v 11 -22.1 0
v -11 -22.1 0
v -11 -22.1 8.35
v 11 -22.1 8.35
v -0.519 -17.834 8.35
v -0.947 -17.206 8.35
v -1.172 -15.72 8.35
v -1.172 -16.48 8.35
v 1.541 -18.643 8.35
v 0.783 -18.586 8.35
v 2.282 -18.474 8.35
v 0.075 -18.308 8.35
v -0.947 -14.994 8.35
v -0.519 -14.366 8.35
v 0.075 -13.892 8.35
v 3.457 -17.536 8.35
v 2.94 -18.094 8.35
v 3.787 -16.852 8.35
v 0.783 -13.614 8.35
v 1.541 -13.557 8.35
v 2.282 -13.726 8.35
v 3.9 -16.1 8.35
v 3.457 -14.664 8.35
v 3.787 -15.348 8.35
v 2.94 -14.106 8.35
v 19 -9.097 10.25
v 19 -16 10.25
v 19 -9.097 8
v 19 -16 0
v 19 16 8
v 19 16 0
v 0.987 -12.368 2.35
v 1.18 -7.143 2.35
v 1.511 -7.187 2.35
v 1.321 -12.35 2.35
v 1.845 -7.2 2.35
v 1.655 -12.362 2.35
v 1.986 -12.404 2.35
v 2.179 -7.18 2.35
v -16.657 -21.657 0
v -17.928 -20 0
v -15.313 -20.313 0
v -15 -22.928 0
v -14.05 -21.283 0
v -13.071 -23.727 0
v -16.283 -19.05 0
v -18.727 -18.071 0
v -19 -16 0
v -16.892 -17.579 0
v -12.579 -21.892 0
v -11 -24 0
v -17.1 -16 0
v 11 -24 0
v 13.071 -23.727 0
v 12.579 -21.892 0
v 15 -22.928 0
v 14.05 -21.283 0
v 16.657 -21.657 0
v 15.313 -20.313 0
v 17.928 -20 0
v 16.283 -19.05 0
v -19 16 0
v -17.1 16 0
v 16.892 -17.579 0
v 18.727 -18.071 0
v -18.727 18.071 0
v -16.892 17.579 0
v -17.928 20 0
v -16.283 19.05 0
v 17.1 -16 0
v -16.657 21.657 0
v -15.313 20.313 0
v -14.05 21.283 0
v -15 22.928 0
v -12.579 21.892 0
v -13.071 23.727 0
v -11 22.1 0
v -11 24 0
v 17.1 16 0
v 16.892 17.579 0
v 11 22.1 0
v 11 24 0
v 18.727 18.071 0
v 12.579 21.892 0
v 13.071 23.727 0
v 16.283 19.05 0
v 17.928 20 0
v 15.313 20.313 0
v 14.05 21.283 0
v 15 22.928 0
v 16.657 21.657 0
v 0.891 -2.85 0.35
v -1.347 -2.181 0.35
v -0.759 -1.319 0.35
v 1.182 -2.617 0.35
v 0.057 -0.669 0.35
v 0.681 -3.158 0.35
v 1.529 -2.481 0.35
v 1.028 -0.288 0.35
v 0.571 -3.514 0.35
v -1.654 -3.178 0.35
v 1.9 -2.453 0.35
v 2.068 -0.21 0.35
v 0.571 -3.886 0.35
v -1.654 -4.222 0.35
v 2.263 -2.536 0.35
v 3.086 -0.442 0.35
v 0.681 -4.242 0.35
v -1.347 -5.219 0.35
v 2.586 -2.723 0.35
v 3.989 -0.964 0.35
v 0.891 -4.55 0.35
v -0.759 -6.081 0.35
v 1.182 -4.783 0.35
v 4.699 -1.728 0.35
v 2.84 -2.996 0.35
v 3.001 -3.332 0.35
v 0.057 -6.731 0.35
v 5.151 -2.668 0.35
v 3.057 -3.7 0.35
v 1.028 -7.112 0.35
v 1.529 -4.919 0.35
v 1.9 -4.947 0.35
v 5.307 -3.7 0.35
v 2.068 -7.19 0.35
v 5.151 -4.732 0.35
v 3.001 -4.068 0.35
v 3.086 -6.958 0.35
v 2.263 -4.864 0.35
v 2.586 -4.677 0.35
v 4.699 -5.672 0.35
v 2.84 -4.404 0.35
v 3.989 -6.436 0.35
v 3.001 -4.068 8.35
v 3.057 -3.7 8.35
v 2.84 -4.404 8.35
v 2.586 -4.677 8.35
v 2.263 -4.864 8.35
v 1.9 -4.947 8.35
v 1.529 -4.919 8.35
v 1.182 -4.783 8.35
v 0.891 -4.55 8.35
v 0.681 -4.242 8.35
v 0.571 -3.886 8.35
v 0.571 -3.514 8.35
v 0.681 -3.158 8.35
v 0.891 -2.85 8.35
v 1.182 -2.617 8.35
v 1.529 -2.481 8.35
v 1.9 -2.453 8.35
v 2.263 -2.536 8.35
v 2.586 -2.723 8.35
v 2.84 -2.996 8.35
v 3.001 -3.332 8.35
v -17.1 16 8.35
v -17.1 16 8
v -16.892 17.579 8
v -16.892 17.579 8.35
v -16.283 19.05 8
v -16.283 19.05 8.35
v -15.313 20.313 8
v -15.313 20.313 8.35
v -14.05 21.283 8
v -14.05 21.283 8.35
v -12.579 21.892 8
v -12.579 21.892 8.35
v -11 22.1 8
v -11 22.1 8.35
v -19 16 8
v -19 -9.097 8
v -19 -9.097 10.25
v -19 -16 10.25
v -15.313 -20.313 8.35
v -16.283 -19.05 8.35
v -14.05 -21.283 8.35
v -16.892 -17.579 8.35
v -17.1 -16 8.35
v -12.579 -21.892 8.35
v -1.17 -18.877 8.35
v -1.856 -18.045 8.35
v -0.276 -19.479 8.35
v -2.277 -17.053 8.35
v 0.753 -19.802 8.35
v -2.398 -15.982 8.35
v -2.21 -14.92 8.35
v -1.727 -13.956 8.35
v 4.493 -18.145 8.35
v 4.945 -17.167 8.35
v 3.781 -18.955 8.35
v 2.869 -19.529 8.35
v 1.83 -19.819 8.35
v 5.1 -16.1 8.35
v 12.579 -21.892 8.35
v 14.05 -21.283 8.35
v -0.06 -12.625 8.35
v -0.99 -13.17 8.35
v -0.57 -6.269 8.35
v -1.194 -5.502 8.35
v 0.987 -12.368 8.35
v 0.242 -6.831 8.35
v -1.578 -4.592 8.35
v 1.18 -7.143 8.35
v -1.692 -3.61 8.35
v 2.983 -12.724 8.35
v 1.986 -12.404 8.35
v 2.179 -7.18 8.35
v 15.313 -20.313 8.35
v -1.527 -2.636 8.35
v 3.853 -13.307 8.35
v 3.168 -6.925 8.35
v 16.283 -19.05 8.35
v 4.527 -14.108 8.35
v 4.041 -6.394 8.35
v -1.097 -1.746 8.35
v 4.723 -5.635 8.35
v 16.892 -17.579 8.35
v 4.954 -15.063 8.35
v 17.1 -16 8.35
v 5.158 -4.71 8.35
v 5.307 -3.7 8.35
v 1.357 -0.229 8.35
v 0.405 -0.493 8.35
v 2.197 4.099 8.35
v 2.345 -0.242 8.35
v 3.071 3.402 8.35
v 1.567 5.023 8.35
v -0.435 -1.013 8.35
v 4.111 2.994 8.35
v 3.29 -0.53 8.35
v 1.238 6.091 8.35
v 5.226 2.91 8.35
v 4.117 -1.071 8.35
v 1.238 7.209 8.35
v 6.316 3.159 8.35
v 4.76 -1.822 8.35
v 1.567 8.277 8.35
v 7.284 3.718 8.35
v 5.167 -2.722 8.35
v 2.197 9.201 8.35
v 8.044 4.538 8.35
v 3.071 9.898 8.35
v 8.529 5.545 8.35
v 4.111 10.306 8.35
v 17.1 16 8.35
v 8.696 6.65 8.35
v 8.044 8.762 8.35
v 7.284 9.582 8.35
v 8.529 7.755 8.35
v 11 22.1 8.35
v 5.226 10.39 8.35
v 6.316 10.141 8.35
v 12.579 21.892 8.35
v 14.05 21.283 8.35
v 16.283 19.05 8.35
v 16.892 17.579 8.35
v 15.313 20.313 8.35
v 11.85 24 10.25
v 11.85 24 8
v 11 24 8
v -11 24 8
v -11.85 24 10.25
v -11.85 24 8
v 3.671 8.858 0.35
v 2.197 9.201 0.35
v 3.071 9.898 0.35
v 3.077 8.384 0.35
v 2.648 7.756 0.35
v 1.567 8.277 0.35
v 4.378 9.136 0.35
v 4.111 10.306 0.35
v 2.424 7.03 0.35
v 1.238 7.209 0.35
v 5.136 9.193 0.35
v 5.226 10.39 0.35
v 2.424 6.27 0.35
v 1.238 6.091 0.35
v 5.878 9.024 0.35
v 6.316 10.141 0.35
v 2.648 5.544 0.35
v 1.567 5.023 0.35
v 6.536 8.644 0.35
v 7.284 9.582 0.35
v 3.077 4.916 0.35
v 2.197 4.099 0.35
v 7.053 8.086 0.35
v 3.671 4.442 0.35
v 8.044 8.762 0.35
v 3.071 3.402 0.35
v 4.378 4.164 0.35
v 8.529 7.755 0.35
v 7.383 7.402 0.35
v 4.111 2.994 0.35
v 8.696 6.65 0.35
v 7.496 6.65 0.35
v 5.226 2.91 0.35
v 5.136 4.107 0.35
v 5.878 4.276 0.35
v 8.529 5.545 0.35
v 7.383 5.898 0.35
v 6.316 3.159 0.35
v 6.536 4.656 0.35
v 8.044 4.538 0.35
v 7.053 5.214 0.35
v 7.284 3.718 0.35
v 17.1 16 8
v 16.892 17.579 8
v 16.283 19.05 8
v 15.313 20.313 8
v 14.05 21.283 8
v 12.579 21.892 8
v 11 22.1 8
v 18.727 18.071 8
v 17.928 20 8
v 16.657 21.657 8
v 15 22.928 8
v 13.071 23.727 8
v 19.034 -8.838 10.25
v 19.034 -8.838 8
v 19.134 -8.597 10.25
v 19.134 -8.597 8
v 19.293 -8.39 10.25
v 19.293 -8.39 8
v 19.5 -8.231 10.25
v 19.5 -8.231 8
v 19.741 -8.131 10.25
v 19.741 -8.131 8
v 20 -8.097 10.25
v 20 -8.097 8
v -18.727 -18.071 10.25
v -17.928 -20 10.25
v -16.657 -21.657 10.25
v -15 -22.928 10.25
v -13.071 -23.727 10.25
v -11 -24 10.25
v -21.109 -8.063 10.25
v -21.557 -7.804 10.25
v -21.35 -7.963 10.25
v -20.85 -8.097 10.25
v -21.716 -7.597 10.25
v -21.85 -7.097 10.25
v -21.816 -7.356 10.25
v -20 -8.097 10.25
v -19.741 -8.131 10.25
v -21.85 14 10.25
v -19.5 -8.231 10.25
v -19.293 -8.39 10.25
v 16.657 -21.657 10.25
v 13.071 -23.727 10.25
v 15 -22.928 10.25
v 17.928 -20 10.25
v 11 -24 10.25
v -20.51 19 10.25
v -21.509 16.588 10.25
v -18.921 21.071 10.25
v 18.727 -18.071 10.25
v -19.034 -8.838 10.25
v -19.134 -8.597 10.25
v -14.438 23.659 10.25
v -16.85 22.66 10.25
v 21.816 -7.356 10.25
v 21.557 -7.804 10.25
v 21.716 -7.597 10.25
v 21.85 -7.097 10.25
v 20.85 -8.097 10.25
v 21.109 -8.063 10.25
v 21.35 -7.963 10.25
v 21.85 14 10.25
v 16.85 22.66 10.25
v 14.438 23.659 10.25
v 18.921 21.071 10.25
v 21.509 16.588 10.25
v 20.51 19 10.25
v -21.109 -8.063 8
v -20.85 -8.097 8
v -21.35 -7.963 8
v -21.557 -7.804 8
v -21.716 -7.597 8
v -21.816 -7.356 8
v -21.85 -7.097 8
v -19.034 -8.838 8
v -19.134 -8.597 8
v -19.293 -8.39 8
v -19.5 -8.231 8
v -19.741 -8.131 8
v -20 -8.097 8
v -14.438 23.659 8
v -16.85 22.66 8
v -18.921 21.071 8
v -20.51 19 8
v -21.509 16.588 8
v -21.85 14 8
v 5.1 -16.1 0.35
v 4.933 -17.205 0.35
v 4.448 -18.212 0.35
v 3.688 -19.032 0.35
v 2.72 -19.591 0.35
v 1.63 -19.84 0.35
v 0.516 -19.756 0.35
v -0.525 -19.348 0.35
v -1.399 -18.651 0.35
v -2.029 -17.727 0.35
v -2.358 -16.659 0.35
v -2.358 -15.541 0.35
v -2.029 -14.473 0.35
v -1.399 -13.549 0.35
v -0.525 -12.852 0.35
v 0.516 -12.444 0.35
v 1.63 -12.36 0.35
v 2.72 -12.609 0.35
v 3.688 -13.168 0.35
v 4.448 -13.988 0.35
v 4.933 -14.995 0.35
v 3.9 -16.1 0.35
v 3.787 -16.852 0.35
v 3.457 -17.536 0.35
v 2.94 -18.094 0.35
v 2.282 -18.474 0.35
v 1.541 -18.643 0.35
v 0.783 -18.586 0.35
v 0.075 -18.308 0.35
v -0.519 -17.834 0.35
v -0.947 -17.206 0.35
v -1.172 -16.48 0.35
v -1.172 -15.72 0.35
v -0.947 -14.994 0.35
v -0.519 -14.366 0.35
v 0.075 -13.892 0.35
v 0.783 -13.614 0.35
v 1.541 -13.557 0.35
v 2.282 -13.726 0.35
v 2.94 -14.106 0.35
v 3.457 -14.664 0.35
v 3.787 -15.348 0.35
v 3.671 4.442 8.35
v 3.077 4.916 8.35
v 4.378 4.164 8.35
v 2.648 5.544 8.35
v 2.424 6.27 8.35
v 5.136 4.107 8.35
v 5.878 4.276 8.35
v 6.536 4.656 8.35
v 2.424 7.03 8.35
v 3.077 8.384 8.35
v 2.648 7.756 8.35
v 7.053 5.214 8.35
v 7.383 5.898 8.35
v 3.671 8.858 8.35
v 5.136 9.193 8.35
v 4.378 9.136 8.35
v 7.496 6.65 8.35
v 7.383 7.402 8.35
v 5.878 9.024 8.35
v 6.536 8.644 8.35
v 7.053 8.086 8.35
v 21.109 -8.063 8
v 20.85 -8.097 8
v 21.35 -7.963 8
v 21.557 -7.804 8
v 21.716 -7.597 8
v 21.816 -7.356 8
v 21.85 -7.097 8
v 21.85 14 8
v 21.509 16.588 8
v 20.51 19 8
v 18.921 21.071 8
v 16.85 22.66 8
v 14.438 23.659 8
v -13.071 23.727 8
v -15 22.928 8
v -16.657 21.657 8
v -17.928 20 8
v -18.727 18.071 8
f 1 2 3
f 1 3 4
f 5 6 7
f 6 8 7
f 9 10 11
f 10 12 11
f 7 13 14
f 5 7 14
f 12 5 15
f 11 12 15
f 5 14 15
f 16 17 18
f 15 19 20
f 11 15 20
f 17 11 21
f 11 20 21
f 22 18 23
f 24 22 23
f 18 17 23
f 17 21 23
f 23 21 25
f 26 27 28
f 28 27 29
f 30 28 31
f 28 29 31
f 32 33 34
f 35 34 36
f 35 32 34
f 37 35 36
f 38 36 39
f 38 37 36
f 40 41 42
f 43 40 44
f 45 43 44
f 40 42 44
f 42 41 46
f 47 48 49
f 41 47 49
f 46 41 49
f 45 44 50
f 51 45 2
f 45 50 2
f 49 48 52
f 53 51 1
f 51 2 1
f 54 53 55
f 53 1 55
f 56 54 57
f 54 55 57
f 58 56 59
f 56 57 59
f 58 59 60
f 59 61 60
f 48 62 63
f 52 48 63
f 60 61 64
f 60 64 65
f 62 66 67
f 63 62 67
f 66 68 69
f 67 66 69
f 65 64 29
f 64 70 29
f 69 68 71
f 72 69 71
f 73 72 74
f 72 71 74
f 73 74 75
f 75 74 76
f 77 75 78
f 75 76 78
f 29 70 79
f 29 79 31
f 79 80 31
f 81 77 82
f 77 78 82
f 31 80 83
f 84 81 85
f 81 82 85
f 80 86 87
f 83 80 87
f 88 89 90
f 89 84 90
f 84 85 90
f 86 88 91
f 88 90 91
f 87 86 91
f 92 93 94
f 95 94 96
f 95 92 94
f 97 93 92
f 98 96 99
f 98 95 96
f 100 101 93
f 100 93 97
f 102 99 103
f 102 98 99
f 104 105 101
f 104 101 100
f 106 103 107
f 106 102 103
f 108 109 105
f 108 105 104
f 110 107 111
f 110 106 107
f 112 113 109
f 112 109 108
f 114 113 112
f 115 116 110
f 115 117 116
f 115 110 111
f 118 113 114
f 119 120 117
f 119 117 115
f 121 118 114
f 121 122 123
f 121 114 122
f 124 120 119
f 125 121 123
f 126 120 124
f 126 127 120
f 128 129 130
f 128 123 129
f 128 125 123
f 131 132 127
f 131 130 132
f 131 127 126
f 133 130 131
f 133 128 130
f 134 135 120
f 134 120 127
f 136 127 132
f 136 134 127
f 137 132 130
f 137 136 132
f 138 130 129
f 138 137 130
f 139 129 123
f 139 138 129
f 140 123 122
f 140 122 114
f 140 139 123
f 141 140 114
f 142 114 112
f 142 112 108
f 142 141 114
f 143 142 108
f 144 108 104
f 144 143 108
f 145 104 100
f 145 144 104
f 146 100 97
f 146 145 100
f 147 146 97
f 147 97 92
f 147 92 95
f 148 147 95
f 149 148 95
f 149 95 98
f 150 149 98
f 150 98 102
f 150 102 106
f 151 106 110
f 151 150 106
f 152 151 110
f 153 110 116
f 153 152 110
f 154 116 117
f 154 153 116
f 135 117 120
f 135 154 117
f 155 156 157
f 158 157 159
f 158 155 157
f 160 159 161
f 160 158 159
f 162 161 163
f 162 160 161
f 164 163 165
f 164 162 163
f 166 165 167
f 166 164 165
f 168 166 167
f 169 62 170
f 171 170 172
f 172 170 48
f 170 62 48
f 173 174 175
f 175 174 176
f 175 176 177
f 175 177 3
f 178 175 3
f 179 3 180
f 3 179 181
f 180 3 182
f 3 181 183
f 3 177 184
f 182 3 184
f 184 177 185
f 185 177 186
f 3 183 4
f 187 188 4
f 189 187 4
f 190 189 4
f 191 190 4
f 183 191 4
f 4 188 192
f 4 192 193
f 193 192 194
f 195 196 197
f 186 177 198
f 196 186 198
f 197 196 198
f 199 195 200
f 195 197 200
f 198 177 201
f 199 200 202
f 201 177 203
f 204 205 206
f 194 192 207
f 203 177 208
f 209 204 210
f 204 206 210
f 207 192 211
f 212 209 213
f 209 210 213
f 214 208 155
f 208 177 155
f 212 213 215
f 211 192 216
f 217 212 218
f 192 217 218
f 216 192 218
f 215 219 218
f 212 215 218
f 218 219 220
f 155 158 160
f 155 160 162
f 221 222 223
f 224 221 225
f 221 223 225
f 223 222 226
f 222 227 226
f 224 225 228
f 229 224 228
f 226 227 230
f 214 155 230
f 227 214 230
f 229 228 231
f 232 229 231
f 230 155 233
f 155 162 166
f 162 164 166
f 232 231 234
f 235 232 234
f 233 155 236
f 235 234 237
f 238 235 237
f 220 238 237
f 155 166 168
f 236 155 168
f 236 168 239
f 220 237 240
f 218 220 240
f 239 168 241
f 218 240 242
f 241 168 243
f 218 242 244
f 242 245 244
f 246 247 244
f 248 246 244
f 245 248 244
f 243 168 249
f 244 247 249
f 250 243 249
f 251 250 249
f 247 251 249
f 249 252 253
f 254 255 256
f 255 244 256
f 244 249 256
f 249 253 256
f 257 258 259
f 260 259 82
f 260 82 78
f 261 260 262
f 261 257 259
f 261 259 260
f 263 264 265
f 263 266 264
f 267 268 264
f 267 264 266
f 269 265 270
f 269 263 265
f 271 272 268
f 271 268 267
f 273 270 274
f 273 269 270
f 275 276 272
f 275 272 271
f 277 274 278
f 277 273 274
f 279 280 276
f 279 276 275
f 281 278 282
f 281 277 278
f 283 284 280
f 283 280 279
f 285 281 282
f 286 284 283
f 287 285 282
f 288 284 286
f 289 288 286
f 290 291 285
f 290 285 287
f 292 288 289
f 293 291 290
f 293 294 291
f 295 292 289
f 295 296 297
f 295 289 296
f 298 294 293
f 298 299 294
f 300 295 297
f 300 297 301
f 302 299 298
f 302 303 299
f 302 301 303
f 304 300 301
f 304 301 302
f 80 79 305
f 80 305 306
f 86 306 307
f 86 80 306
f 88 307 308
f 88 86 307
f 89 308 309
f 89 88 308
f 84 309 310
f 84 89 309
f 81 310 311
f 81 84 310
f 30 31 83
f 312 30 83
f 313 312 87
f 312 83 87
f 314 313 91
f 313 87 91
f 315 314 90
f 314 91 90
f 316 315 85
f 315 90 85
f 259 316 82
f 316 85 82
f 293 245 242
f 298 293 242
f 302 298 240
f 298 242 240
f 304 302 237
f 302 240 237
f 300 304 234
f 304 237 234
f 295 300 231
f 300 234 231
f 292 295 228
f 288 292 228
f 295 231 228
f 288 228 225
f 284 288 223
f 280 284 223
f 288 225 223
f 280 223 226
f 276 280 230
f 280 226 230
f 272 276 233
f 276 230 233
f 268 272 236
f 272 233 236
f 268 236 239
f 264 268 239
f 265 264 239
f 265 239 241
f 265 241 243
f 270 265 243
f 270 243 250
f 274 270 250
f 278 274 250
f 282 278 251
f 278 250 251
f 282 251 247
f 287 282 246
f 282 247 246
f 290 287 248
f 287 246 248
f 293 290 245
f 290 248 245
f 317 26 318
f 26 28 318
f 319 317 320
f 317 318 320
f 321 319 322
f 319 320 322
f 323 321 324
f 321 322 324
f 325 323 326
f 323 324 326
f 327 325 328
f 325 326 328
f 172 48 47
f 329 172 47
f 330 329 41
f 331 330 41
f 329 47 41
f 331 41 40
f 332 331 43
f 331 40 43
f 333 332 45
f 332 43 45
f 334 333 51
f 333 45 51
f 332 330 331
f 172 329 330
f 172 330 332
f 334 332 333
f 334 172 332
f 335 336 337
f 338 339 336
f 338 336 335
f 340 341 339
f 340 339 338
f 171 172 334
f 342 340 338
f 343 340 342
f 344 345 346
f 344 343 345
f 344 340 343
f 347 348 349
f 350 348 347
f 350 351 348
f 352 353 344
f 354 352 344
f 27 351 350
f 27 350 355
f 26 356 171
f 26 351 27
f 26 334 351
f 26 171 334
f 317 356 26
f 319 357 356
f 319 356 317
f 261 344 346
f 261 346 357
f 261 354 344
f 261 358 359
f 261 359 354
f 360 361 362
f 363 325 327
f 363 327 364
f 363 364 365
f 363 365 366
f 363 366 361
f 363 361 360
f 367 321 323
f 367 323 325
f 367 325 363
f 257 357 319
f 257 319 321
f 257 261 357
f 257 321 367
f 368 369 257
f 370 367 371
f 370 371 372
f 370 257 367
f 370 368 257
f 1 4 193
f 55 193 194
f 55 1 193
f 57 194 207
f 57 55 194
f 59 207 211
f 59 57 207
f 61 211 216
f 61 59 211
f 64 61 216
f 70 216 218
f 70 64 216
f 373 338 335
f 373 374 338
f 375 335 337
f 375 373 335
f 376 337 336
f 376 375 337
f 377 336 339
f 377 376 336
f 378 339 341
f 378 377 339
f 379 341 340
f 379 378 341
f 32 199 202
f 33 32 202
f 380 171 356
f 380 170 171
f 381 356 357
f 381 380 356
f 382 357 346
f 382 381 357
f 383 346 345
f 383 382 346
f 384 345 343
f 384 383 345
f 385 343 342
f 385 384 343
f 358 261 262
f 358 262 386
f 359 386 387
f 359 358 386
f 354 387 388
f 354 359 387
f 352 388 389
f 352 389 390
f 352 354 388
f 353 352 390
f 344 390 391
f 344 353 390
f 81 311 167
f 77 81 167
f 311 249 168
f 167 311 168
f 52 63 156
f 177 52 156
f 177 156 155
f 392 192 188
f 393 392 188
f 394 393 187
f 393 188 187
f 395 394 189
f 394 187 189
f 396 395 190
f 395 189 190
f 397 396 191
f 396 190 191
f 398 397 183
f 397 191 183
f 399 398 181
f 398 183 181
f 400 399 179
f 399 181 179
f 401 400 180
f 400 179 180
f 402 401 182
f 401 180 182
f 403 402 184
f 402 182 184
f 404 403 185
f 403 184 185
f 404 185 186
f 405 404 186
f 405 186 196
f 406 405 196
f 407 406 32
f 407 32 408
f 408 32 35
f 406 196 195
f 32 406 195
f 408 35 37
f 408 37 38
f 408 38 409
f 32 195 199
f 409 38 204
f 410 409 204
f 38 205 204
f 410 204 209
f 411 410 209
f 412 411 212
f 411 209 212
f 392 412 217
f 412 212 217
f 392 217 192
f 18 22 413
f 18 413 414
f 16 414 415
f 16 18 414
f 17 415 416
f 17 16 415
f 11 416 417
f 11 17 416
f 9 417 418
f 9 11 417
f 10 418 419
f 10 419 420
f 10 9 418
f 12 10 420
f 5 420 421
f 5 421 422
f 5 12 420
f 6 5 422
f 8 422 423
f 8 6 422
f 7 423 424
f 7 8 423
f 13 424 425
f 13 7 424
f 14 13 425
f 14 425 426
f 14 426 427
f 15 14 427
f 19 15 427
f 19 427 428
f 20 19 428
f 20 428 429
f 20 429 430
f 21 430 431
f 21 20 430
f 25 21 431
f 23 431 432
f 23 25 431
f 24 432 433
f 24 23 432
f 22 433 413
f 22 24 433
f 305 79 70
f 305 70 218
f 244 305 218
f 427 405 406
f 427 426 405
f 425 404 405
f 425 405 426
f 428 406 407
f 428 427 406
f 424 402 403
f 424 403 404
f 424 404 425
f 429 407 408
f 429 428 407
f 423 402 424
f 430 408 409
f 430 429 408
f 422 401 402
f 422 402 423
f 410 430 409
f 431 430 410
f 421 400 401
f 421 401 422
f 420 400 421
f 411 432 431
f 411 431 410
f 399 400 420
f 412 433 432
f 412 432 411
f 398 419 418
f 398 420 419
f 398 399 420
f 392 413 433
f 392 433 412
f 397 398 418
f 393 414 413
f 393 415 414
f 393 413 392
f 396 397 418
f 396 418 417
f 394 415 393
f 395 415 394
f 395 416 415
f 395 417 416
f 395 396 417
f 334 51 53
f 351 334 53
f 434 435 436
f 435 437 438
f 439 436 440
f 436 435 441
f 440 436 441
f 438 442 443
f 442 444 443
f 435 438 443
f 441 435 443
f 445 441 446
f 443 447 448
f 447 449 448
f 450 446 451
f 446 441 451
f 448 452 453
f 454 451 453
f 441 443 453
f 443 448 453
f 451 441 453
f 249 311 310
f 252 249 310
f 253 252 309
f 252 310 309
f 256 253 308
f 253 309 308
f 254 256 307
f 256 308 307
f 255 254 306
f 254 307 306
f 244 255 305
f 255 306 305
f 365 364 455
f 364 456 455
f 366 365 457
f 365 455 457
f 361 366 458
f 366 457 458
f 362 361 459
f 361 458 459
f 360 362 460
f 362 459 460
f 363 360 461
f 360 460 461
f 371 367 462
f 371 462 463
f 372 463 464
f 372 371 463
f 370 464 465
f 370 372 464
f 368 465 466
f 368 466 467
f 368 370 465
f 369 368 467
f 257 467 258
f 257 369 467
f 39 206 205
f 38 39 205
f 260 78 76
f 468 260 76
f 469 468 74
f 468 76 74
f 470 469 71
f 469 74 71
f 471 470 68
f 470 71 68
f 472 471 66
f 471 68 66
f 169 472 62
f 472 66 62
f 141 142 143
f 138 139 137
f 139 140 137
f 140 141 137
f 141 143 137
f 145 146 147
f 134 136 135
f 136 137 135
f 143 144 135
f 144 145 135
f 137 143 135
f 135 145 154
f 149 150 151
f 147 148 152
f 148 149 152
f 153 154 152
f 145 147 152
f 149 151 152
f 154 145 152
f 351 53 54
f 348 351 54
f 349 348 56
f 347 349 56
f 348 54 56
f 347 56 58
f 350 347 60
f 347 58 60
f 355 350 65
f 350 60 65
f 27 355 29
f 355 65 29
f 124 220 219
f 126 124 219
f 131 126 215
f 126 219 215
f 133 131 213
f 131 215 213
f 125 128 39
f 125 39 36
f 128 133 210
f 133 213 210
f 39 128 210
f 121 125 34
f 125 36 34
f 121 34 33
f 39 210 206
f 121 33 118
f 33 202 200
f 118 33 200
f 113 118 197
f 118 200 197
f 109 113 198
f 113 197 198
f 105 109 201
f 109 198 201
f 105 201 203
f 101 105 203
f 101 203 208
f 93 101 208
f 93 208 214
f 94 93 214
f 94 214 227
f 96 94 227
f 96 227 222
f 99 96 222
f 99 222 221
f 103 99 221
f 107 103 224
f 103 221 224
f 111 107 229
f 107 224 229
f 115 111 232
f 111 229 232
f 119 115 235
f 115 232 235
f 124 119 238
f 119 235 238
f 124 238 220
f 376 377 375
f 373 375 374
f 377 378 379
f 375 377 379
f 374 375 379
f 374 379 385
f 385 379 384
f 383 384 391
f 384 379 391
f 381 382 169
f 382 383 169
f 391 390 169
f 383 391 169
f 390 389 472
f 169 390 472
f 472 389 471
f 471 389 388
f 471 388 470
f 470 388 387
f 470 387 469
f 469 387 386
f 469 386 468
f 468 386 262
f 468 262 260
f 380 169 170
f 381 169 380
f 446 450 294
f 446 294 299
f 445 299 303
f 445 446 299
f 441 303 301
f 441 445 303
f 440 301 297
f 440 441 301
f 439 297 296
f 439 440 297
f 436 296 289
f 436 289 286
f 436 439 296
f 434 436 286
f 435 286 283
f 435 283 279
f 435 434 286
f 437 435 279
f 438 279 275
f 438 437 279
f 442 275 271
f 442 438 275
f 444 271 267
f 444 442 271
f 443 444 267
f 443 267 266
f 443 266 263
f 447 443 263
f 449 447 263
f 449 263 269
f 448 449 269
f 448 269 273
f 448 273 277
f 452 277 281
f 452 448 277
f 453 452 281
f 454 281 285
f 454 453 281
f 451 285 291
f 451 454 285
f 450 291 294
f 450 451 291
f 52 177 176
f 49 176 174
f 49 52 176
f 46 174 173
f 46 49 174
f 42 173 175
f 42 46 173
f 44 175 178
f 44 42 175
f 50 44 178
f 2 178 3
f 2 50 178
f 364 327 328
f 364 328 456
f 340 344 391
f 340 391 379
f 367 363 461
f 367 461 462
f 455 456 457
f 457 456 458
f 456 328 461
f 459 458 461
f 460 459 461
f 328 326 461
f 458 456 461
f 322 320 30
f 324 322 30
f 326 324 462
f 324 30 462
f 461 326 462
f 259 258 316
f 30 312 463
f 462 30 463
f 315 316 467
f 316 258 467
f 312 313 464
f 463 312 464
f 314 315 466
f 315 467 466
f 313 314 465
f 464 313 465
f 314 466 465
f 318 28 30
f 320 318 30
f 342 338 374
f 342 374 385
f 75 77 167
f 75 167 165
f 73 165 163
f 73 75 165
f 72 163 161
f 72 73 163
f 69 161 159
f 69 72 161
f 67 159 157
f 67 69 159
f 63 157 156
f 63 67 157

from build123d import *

# Parameters (mm, degrees)
F1_DEPTH     = 10.25
F3_DEPTH     = 2.25
F4_R         = 1
F5_T         = 1.9
F5_T3_DEPTH  = 4.8
F5_T5_DEPTH  = 27.8972844735
F5_T8_ANGLE  = 90.000000001
F5_T10_ANGLE = 90.000000001
F6_R         = 3.75
F6_R_2       = 2.55
F7_DEPTH     = 8
F8_R         = 3.5
F8_R_2       = 1.25
F9_DEPTH     = 8
F10_R        = 3.75
F10_R_2      = 2.55
F11_DEPTH    = 8
F13_DEPTH    = 6


# Not quite as in the source:
# - a shell that OpenCascade refuses in one call is made with other operations: the cavity is built on its own and cut out


with BuildPart() as f1:
    # F0 (on Top) → F1 (new body)
    with BuildSketch(Plane.XY):
        with BuildLine():
            Line((11, 24), (-11, 24))
            ThreePointArc((-11, 24), (-16.6568542495, 21.6568542495), (-19, 16))
            Line((-19, 16), (-19, -16))
            ThreePointArc((-19, -16), (-16.6568542495, -21.6568542495), (-11, -24))
            Line((-11, -24), (11, -24))
            ThreePointArc((11, -24), (16.6568542495, -21.6568542495), (19, -16))
            Line((19, -16), (19, 16))
            ThreePointArc((19, 16), (16.6568542495, 21.6568542495), (11, 24))
        make_face()
    extrude(amount=F1_DEPTH)

    # F2 (on face) → F3 (join)
    with BuildSketch(Plane.XY.offset(10.25)):
        with BuildLine():
            ThreePointArc((-19, 16), (-16.6568542495, 21.6568542495), (-11, 24))
            Line((-11, 24), (-11.85, 24))
            ThreePointArc((-11.85, 24), (-18.9210678119, 21.0710678119), (-21.85, 14))
            Line((-21.85, 14), (-21.85, -8.0972844735))
            Line((-21.85, -8.0972844735), (-19, -8.0972844735))
            Line((-19, -8.0972844735), (-19, 16))
        make_face()
        with BuildLine():
            Line((21.85, -5.7972865179), (21.85, 14))
            ThreePointArc((21.85, 14), (18.9210678119, 21.0710678119), (11.85, 24))
            Line((11.85, 24), (11, 24))
            ThreePointArc((11, 24), (16.6568542495, 21.6568542495), (19, 16))
            Line((19, 16), (19, -8.0972844735))
            Line((19, -8.0972844735), (21.85, -8.0972844735))
            Line((21.85, -8.0972844735), (21.85, -5.7972865179))
        make_face()
    extrude(amount=-F3_DEPTH)

    # F4
    f4_edges = [f1.edges().sort_by_distance(p)[0] for p in [
        (21.85, -8.097284, 9.125),
        (19, -8.097284, 9.125),
        (-21.85, -8.097284, 9.125),
        (-19, -8.097284, 9.125),
    ]]
    fillet(f4_edges, radius=F4_R)

    # F5: shell of thickness 1.9, made by hand


with BuildPart() as f5_core1:
    # F5_t2: copy of F1
    add(f1.part)

    # the walls: a layer under each face that stays
    f5_faces = [f5_core1.faces().sort_by_distance(p)[0] for p in [
        (19, 0, 5.125),
        (0, 0, 10.25),
        (19.2928932188, -8.3901776923, 9.125),
        (16.6568542495, -21.6568542495, 5.125),
        (20.0416666667, -3.5810703946, 8),
        (16.6568542495, 21.6568542495, 4),
        (-21.85, 3.4513577633, 9.125),
        (-18.9210678119, 21.0710678119, 9.125),
        (-20.425, -8.0972844735, 9.125),
        (0, 24, 5.125),
        (-19.2928932188, -8.3901776923, 9.125),
        (18.9210678119, 21.0710678119, 9.125),
        (-19, 0, 5.125),
        (21.85, 3.4513577633, 9.125),
        (-16.6568542495, -21.6568542495, 5.125),
        (0, -24, 5.125),
        (20.425, -8.0972844735, 9.125),
        (-16.6568542495, 21.6568542495, 4),
        (-20.0416666667, -3.5810703946, 8),
    ]]
    thicken(f5_faces, amount=-F5_T, mode=Mode.SUBTRACT)

    # F5_s4 → F5_t3 (cut)
    with BuildSketch(Plane.XZ.offset(6.1972844735)):
        Polygon((19.019, 7.981), (17.1, 8), (17.1, 9.9), (19, 9.9), align=None)
        Polygon((-19.019, 7.981), (-17.1, 8), (-17.1, 9.9), (-19, 9.9), align=None)
    extrude(amount=F5_T3_DEPTH, mode=Mode.SUBTRACT)

    # F5_s6 → F5_t5 (cut)
    with BuildSketch(Plane.XZ.offset(-17.9)):
        Polygon((19.019, 7.981), (17.1, 8), (17.1, 9.9), (19, 9.9), align=None)
        Polygon((-19.019, 7.981), (-17.1, 8), (-17.1, 9.9), (-19, 9.9), align=None)
    extrude(amount=F5_T5_DEPTH, mode=Mode.SUBTRACT)

    # F5_s7 → F5_t8 (revolve, cut)
    with BuildSketch(Plane.YZ.offset(11)):
        Polygon((24.019, 7.981), (24, 9.9), (22.1, 9.9), (22.1, 8), align=None)
    revolve(axis=Axis((11, 16, 8), (0, 0, -1)), revolution_arc=F5_T8_ANGLE, mode=Mode.SUBTRACT)

    # F5_s9 → F5_t10 (revolve, cut)
    with BuildSketch(Plane.XZ.offset(-16)):
        Polygon((-19.019, 7.981), (-17.1, 8), (-17.1, 9.9), (-19, 9.9), align=None)
    revolve(axis=Axis((-11, 16, 8), (0, 0, -1)), revolution_arc=F5_T10_ANGLE, mode=Mode.SUBTRACT)


with BuildPart() as f1_1:
    add(f1.part)

    # what is left inside the walls is the cavity
    f5_cavity = [f5_core1.part.solids().sort_by_distance(p)[0] for p in [
        (0, -7.366667, 0.019),
    ]]
    add(f5_cavity, mode=Mode.SUBTRACT)

    # F6 (on face) → F7 (join)
    with BuildSketch(Plane(origin=(0, 0, 8.35), x_dir=(1, 0, 0), z_dir=(0, 0, -1))):
        with Locations((1.35, 16.1)):
            Circle(F6_R)
        with Locations((1.35, 16.1)):
            Circle(F6_R_2, mode=Mode.SUBTRACT)
    extrude(amount=F7_DEPTH)

    # F8 (on face) → F9 (join)
    with BuildSketch(Plane(origin=(0, 0, 8.35), x_dir=(1, 0, 0), z_dir=(0, 0, -1))):
        with Locations((1.8068233039, 3.7)):
            Circle(F8_R)
        with Locations((1.8068233039, 3.7)):
            Circle(F8_R_2, mode=Mode.SUBTRACT)
    extrude(amount=F9_DEPTH)

    # F10 (on face) → F11 (join)
    with BuildSketch(Plane(origin=(0, 0, 8.35), x_dir=(1, 0, 0), z_dir=(0, 0, -1))):
        with Locations((4.9459114671, -6.65)):
            Circle(F10_R)
        with Locations((4.9459114671, -6.65)):
            Circle(F10_R_2, mode=Mode.SUBTRACT)
    extrude(amount=F11_DEPTH)

    # F12 (on face) → F13 (join)
    with BuildSketch(Plane(origin=(0, 0, 8.35), x_dir=(1, 0, 0), z_dir=(0, 0, -1))):
        with BuildLine():
            ThreePointArc((1.9864868995, 12.4044101382), (1.4880585521, 12.3525422169), (0.987164824, 12.3675945243))
            Line((0.987164824, 12.3675945243), (1.1796292386, 7.1433454088))
            ThreePointArc((1.1796292386, 7.1433454088), (1.6779686553, 7.1976272642), (2.1789513141, 7.1801610227))
            Line((2.1789513141, 7.1801610227), (1.9864868995, 12.4044101382))
        make_face()
    extrude(amount=F13_DEPTH)


solid = f1_1.part
